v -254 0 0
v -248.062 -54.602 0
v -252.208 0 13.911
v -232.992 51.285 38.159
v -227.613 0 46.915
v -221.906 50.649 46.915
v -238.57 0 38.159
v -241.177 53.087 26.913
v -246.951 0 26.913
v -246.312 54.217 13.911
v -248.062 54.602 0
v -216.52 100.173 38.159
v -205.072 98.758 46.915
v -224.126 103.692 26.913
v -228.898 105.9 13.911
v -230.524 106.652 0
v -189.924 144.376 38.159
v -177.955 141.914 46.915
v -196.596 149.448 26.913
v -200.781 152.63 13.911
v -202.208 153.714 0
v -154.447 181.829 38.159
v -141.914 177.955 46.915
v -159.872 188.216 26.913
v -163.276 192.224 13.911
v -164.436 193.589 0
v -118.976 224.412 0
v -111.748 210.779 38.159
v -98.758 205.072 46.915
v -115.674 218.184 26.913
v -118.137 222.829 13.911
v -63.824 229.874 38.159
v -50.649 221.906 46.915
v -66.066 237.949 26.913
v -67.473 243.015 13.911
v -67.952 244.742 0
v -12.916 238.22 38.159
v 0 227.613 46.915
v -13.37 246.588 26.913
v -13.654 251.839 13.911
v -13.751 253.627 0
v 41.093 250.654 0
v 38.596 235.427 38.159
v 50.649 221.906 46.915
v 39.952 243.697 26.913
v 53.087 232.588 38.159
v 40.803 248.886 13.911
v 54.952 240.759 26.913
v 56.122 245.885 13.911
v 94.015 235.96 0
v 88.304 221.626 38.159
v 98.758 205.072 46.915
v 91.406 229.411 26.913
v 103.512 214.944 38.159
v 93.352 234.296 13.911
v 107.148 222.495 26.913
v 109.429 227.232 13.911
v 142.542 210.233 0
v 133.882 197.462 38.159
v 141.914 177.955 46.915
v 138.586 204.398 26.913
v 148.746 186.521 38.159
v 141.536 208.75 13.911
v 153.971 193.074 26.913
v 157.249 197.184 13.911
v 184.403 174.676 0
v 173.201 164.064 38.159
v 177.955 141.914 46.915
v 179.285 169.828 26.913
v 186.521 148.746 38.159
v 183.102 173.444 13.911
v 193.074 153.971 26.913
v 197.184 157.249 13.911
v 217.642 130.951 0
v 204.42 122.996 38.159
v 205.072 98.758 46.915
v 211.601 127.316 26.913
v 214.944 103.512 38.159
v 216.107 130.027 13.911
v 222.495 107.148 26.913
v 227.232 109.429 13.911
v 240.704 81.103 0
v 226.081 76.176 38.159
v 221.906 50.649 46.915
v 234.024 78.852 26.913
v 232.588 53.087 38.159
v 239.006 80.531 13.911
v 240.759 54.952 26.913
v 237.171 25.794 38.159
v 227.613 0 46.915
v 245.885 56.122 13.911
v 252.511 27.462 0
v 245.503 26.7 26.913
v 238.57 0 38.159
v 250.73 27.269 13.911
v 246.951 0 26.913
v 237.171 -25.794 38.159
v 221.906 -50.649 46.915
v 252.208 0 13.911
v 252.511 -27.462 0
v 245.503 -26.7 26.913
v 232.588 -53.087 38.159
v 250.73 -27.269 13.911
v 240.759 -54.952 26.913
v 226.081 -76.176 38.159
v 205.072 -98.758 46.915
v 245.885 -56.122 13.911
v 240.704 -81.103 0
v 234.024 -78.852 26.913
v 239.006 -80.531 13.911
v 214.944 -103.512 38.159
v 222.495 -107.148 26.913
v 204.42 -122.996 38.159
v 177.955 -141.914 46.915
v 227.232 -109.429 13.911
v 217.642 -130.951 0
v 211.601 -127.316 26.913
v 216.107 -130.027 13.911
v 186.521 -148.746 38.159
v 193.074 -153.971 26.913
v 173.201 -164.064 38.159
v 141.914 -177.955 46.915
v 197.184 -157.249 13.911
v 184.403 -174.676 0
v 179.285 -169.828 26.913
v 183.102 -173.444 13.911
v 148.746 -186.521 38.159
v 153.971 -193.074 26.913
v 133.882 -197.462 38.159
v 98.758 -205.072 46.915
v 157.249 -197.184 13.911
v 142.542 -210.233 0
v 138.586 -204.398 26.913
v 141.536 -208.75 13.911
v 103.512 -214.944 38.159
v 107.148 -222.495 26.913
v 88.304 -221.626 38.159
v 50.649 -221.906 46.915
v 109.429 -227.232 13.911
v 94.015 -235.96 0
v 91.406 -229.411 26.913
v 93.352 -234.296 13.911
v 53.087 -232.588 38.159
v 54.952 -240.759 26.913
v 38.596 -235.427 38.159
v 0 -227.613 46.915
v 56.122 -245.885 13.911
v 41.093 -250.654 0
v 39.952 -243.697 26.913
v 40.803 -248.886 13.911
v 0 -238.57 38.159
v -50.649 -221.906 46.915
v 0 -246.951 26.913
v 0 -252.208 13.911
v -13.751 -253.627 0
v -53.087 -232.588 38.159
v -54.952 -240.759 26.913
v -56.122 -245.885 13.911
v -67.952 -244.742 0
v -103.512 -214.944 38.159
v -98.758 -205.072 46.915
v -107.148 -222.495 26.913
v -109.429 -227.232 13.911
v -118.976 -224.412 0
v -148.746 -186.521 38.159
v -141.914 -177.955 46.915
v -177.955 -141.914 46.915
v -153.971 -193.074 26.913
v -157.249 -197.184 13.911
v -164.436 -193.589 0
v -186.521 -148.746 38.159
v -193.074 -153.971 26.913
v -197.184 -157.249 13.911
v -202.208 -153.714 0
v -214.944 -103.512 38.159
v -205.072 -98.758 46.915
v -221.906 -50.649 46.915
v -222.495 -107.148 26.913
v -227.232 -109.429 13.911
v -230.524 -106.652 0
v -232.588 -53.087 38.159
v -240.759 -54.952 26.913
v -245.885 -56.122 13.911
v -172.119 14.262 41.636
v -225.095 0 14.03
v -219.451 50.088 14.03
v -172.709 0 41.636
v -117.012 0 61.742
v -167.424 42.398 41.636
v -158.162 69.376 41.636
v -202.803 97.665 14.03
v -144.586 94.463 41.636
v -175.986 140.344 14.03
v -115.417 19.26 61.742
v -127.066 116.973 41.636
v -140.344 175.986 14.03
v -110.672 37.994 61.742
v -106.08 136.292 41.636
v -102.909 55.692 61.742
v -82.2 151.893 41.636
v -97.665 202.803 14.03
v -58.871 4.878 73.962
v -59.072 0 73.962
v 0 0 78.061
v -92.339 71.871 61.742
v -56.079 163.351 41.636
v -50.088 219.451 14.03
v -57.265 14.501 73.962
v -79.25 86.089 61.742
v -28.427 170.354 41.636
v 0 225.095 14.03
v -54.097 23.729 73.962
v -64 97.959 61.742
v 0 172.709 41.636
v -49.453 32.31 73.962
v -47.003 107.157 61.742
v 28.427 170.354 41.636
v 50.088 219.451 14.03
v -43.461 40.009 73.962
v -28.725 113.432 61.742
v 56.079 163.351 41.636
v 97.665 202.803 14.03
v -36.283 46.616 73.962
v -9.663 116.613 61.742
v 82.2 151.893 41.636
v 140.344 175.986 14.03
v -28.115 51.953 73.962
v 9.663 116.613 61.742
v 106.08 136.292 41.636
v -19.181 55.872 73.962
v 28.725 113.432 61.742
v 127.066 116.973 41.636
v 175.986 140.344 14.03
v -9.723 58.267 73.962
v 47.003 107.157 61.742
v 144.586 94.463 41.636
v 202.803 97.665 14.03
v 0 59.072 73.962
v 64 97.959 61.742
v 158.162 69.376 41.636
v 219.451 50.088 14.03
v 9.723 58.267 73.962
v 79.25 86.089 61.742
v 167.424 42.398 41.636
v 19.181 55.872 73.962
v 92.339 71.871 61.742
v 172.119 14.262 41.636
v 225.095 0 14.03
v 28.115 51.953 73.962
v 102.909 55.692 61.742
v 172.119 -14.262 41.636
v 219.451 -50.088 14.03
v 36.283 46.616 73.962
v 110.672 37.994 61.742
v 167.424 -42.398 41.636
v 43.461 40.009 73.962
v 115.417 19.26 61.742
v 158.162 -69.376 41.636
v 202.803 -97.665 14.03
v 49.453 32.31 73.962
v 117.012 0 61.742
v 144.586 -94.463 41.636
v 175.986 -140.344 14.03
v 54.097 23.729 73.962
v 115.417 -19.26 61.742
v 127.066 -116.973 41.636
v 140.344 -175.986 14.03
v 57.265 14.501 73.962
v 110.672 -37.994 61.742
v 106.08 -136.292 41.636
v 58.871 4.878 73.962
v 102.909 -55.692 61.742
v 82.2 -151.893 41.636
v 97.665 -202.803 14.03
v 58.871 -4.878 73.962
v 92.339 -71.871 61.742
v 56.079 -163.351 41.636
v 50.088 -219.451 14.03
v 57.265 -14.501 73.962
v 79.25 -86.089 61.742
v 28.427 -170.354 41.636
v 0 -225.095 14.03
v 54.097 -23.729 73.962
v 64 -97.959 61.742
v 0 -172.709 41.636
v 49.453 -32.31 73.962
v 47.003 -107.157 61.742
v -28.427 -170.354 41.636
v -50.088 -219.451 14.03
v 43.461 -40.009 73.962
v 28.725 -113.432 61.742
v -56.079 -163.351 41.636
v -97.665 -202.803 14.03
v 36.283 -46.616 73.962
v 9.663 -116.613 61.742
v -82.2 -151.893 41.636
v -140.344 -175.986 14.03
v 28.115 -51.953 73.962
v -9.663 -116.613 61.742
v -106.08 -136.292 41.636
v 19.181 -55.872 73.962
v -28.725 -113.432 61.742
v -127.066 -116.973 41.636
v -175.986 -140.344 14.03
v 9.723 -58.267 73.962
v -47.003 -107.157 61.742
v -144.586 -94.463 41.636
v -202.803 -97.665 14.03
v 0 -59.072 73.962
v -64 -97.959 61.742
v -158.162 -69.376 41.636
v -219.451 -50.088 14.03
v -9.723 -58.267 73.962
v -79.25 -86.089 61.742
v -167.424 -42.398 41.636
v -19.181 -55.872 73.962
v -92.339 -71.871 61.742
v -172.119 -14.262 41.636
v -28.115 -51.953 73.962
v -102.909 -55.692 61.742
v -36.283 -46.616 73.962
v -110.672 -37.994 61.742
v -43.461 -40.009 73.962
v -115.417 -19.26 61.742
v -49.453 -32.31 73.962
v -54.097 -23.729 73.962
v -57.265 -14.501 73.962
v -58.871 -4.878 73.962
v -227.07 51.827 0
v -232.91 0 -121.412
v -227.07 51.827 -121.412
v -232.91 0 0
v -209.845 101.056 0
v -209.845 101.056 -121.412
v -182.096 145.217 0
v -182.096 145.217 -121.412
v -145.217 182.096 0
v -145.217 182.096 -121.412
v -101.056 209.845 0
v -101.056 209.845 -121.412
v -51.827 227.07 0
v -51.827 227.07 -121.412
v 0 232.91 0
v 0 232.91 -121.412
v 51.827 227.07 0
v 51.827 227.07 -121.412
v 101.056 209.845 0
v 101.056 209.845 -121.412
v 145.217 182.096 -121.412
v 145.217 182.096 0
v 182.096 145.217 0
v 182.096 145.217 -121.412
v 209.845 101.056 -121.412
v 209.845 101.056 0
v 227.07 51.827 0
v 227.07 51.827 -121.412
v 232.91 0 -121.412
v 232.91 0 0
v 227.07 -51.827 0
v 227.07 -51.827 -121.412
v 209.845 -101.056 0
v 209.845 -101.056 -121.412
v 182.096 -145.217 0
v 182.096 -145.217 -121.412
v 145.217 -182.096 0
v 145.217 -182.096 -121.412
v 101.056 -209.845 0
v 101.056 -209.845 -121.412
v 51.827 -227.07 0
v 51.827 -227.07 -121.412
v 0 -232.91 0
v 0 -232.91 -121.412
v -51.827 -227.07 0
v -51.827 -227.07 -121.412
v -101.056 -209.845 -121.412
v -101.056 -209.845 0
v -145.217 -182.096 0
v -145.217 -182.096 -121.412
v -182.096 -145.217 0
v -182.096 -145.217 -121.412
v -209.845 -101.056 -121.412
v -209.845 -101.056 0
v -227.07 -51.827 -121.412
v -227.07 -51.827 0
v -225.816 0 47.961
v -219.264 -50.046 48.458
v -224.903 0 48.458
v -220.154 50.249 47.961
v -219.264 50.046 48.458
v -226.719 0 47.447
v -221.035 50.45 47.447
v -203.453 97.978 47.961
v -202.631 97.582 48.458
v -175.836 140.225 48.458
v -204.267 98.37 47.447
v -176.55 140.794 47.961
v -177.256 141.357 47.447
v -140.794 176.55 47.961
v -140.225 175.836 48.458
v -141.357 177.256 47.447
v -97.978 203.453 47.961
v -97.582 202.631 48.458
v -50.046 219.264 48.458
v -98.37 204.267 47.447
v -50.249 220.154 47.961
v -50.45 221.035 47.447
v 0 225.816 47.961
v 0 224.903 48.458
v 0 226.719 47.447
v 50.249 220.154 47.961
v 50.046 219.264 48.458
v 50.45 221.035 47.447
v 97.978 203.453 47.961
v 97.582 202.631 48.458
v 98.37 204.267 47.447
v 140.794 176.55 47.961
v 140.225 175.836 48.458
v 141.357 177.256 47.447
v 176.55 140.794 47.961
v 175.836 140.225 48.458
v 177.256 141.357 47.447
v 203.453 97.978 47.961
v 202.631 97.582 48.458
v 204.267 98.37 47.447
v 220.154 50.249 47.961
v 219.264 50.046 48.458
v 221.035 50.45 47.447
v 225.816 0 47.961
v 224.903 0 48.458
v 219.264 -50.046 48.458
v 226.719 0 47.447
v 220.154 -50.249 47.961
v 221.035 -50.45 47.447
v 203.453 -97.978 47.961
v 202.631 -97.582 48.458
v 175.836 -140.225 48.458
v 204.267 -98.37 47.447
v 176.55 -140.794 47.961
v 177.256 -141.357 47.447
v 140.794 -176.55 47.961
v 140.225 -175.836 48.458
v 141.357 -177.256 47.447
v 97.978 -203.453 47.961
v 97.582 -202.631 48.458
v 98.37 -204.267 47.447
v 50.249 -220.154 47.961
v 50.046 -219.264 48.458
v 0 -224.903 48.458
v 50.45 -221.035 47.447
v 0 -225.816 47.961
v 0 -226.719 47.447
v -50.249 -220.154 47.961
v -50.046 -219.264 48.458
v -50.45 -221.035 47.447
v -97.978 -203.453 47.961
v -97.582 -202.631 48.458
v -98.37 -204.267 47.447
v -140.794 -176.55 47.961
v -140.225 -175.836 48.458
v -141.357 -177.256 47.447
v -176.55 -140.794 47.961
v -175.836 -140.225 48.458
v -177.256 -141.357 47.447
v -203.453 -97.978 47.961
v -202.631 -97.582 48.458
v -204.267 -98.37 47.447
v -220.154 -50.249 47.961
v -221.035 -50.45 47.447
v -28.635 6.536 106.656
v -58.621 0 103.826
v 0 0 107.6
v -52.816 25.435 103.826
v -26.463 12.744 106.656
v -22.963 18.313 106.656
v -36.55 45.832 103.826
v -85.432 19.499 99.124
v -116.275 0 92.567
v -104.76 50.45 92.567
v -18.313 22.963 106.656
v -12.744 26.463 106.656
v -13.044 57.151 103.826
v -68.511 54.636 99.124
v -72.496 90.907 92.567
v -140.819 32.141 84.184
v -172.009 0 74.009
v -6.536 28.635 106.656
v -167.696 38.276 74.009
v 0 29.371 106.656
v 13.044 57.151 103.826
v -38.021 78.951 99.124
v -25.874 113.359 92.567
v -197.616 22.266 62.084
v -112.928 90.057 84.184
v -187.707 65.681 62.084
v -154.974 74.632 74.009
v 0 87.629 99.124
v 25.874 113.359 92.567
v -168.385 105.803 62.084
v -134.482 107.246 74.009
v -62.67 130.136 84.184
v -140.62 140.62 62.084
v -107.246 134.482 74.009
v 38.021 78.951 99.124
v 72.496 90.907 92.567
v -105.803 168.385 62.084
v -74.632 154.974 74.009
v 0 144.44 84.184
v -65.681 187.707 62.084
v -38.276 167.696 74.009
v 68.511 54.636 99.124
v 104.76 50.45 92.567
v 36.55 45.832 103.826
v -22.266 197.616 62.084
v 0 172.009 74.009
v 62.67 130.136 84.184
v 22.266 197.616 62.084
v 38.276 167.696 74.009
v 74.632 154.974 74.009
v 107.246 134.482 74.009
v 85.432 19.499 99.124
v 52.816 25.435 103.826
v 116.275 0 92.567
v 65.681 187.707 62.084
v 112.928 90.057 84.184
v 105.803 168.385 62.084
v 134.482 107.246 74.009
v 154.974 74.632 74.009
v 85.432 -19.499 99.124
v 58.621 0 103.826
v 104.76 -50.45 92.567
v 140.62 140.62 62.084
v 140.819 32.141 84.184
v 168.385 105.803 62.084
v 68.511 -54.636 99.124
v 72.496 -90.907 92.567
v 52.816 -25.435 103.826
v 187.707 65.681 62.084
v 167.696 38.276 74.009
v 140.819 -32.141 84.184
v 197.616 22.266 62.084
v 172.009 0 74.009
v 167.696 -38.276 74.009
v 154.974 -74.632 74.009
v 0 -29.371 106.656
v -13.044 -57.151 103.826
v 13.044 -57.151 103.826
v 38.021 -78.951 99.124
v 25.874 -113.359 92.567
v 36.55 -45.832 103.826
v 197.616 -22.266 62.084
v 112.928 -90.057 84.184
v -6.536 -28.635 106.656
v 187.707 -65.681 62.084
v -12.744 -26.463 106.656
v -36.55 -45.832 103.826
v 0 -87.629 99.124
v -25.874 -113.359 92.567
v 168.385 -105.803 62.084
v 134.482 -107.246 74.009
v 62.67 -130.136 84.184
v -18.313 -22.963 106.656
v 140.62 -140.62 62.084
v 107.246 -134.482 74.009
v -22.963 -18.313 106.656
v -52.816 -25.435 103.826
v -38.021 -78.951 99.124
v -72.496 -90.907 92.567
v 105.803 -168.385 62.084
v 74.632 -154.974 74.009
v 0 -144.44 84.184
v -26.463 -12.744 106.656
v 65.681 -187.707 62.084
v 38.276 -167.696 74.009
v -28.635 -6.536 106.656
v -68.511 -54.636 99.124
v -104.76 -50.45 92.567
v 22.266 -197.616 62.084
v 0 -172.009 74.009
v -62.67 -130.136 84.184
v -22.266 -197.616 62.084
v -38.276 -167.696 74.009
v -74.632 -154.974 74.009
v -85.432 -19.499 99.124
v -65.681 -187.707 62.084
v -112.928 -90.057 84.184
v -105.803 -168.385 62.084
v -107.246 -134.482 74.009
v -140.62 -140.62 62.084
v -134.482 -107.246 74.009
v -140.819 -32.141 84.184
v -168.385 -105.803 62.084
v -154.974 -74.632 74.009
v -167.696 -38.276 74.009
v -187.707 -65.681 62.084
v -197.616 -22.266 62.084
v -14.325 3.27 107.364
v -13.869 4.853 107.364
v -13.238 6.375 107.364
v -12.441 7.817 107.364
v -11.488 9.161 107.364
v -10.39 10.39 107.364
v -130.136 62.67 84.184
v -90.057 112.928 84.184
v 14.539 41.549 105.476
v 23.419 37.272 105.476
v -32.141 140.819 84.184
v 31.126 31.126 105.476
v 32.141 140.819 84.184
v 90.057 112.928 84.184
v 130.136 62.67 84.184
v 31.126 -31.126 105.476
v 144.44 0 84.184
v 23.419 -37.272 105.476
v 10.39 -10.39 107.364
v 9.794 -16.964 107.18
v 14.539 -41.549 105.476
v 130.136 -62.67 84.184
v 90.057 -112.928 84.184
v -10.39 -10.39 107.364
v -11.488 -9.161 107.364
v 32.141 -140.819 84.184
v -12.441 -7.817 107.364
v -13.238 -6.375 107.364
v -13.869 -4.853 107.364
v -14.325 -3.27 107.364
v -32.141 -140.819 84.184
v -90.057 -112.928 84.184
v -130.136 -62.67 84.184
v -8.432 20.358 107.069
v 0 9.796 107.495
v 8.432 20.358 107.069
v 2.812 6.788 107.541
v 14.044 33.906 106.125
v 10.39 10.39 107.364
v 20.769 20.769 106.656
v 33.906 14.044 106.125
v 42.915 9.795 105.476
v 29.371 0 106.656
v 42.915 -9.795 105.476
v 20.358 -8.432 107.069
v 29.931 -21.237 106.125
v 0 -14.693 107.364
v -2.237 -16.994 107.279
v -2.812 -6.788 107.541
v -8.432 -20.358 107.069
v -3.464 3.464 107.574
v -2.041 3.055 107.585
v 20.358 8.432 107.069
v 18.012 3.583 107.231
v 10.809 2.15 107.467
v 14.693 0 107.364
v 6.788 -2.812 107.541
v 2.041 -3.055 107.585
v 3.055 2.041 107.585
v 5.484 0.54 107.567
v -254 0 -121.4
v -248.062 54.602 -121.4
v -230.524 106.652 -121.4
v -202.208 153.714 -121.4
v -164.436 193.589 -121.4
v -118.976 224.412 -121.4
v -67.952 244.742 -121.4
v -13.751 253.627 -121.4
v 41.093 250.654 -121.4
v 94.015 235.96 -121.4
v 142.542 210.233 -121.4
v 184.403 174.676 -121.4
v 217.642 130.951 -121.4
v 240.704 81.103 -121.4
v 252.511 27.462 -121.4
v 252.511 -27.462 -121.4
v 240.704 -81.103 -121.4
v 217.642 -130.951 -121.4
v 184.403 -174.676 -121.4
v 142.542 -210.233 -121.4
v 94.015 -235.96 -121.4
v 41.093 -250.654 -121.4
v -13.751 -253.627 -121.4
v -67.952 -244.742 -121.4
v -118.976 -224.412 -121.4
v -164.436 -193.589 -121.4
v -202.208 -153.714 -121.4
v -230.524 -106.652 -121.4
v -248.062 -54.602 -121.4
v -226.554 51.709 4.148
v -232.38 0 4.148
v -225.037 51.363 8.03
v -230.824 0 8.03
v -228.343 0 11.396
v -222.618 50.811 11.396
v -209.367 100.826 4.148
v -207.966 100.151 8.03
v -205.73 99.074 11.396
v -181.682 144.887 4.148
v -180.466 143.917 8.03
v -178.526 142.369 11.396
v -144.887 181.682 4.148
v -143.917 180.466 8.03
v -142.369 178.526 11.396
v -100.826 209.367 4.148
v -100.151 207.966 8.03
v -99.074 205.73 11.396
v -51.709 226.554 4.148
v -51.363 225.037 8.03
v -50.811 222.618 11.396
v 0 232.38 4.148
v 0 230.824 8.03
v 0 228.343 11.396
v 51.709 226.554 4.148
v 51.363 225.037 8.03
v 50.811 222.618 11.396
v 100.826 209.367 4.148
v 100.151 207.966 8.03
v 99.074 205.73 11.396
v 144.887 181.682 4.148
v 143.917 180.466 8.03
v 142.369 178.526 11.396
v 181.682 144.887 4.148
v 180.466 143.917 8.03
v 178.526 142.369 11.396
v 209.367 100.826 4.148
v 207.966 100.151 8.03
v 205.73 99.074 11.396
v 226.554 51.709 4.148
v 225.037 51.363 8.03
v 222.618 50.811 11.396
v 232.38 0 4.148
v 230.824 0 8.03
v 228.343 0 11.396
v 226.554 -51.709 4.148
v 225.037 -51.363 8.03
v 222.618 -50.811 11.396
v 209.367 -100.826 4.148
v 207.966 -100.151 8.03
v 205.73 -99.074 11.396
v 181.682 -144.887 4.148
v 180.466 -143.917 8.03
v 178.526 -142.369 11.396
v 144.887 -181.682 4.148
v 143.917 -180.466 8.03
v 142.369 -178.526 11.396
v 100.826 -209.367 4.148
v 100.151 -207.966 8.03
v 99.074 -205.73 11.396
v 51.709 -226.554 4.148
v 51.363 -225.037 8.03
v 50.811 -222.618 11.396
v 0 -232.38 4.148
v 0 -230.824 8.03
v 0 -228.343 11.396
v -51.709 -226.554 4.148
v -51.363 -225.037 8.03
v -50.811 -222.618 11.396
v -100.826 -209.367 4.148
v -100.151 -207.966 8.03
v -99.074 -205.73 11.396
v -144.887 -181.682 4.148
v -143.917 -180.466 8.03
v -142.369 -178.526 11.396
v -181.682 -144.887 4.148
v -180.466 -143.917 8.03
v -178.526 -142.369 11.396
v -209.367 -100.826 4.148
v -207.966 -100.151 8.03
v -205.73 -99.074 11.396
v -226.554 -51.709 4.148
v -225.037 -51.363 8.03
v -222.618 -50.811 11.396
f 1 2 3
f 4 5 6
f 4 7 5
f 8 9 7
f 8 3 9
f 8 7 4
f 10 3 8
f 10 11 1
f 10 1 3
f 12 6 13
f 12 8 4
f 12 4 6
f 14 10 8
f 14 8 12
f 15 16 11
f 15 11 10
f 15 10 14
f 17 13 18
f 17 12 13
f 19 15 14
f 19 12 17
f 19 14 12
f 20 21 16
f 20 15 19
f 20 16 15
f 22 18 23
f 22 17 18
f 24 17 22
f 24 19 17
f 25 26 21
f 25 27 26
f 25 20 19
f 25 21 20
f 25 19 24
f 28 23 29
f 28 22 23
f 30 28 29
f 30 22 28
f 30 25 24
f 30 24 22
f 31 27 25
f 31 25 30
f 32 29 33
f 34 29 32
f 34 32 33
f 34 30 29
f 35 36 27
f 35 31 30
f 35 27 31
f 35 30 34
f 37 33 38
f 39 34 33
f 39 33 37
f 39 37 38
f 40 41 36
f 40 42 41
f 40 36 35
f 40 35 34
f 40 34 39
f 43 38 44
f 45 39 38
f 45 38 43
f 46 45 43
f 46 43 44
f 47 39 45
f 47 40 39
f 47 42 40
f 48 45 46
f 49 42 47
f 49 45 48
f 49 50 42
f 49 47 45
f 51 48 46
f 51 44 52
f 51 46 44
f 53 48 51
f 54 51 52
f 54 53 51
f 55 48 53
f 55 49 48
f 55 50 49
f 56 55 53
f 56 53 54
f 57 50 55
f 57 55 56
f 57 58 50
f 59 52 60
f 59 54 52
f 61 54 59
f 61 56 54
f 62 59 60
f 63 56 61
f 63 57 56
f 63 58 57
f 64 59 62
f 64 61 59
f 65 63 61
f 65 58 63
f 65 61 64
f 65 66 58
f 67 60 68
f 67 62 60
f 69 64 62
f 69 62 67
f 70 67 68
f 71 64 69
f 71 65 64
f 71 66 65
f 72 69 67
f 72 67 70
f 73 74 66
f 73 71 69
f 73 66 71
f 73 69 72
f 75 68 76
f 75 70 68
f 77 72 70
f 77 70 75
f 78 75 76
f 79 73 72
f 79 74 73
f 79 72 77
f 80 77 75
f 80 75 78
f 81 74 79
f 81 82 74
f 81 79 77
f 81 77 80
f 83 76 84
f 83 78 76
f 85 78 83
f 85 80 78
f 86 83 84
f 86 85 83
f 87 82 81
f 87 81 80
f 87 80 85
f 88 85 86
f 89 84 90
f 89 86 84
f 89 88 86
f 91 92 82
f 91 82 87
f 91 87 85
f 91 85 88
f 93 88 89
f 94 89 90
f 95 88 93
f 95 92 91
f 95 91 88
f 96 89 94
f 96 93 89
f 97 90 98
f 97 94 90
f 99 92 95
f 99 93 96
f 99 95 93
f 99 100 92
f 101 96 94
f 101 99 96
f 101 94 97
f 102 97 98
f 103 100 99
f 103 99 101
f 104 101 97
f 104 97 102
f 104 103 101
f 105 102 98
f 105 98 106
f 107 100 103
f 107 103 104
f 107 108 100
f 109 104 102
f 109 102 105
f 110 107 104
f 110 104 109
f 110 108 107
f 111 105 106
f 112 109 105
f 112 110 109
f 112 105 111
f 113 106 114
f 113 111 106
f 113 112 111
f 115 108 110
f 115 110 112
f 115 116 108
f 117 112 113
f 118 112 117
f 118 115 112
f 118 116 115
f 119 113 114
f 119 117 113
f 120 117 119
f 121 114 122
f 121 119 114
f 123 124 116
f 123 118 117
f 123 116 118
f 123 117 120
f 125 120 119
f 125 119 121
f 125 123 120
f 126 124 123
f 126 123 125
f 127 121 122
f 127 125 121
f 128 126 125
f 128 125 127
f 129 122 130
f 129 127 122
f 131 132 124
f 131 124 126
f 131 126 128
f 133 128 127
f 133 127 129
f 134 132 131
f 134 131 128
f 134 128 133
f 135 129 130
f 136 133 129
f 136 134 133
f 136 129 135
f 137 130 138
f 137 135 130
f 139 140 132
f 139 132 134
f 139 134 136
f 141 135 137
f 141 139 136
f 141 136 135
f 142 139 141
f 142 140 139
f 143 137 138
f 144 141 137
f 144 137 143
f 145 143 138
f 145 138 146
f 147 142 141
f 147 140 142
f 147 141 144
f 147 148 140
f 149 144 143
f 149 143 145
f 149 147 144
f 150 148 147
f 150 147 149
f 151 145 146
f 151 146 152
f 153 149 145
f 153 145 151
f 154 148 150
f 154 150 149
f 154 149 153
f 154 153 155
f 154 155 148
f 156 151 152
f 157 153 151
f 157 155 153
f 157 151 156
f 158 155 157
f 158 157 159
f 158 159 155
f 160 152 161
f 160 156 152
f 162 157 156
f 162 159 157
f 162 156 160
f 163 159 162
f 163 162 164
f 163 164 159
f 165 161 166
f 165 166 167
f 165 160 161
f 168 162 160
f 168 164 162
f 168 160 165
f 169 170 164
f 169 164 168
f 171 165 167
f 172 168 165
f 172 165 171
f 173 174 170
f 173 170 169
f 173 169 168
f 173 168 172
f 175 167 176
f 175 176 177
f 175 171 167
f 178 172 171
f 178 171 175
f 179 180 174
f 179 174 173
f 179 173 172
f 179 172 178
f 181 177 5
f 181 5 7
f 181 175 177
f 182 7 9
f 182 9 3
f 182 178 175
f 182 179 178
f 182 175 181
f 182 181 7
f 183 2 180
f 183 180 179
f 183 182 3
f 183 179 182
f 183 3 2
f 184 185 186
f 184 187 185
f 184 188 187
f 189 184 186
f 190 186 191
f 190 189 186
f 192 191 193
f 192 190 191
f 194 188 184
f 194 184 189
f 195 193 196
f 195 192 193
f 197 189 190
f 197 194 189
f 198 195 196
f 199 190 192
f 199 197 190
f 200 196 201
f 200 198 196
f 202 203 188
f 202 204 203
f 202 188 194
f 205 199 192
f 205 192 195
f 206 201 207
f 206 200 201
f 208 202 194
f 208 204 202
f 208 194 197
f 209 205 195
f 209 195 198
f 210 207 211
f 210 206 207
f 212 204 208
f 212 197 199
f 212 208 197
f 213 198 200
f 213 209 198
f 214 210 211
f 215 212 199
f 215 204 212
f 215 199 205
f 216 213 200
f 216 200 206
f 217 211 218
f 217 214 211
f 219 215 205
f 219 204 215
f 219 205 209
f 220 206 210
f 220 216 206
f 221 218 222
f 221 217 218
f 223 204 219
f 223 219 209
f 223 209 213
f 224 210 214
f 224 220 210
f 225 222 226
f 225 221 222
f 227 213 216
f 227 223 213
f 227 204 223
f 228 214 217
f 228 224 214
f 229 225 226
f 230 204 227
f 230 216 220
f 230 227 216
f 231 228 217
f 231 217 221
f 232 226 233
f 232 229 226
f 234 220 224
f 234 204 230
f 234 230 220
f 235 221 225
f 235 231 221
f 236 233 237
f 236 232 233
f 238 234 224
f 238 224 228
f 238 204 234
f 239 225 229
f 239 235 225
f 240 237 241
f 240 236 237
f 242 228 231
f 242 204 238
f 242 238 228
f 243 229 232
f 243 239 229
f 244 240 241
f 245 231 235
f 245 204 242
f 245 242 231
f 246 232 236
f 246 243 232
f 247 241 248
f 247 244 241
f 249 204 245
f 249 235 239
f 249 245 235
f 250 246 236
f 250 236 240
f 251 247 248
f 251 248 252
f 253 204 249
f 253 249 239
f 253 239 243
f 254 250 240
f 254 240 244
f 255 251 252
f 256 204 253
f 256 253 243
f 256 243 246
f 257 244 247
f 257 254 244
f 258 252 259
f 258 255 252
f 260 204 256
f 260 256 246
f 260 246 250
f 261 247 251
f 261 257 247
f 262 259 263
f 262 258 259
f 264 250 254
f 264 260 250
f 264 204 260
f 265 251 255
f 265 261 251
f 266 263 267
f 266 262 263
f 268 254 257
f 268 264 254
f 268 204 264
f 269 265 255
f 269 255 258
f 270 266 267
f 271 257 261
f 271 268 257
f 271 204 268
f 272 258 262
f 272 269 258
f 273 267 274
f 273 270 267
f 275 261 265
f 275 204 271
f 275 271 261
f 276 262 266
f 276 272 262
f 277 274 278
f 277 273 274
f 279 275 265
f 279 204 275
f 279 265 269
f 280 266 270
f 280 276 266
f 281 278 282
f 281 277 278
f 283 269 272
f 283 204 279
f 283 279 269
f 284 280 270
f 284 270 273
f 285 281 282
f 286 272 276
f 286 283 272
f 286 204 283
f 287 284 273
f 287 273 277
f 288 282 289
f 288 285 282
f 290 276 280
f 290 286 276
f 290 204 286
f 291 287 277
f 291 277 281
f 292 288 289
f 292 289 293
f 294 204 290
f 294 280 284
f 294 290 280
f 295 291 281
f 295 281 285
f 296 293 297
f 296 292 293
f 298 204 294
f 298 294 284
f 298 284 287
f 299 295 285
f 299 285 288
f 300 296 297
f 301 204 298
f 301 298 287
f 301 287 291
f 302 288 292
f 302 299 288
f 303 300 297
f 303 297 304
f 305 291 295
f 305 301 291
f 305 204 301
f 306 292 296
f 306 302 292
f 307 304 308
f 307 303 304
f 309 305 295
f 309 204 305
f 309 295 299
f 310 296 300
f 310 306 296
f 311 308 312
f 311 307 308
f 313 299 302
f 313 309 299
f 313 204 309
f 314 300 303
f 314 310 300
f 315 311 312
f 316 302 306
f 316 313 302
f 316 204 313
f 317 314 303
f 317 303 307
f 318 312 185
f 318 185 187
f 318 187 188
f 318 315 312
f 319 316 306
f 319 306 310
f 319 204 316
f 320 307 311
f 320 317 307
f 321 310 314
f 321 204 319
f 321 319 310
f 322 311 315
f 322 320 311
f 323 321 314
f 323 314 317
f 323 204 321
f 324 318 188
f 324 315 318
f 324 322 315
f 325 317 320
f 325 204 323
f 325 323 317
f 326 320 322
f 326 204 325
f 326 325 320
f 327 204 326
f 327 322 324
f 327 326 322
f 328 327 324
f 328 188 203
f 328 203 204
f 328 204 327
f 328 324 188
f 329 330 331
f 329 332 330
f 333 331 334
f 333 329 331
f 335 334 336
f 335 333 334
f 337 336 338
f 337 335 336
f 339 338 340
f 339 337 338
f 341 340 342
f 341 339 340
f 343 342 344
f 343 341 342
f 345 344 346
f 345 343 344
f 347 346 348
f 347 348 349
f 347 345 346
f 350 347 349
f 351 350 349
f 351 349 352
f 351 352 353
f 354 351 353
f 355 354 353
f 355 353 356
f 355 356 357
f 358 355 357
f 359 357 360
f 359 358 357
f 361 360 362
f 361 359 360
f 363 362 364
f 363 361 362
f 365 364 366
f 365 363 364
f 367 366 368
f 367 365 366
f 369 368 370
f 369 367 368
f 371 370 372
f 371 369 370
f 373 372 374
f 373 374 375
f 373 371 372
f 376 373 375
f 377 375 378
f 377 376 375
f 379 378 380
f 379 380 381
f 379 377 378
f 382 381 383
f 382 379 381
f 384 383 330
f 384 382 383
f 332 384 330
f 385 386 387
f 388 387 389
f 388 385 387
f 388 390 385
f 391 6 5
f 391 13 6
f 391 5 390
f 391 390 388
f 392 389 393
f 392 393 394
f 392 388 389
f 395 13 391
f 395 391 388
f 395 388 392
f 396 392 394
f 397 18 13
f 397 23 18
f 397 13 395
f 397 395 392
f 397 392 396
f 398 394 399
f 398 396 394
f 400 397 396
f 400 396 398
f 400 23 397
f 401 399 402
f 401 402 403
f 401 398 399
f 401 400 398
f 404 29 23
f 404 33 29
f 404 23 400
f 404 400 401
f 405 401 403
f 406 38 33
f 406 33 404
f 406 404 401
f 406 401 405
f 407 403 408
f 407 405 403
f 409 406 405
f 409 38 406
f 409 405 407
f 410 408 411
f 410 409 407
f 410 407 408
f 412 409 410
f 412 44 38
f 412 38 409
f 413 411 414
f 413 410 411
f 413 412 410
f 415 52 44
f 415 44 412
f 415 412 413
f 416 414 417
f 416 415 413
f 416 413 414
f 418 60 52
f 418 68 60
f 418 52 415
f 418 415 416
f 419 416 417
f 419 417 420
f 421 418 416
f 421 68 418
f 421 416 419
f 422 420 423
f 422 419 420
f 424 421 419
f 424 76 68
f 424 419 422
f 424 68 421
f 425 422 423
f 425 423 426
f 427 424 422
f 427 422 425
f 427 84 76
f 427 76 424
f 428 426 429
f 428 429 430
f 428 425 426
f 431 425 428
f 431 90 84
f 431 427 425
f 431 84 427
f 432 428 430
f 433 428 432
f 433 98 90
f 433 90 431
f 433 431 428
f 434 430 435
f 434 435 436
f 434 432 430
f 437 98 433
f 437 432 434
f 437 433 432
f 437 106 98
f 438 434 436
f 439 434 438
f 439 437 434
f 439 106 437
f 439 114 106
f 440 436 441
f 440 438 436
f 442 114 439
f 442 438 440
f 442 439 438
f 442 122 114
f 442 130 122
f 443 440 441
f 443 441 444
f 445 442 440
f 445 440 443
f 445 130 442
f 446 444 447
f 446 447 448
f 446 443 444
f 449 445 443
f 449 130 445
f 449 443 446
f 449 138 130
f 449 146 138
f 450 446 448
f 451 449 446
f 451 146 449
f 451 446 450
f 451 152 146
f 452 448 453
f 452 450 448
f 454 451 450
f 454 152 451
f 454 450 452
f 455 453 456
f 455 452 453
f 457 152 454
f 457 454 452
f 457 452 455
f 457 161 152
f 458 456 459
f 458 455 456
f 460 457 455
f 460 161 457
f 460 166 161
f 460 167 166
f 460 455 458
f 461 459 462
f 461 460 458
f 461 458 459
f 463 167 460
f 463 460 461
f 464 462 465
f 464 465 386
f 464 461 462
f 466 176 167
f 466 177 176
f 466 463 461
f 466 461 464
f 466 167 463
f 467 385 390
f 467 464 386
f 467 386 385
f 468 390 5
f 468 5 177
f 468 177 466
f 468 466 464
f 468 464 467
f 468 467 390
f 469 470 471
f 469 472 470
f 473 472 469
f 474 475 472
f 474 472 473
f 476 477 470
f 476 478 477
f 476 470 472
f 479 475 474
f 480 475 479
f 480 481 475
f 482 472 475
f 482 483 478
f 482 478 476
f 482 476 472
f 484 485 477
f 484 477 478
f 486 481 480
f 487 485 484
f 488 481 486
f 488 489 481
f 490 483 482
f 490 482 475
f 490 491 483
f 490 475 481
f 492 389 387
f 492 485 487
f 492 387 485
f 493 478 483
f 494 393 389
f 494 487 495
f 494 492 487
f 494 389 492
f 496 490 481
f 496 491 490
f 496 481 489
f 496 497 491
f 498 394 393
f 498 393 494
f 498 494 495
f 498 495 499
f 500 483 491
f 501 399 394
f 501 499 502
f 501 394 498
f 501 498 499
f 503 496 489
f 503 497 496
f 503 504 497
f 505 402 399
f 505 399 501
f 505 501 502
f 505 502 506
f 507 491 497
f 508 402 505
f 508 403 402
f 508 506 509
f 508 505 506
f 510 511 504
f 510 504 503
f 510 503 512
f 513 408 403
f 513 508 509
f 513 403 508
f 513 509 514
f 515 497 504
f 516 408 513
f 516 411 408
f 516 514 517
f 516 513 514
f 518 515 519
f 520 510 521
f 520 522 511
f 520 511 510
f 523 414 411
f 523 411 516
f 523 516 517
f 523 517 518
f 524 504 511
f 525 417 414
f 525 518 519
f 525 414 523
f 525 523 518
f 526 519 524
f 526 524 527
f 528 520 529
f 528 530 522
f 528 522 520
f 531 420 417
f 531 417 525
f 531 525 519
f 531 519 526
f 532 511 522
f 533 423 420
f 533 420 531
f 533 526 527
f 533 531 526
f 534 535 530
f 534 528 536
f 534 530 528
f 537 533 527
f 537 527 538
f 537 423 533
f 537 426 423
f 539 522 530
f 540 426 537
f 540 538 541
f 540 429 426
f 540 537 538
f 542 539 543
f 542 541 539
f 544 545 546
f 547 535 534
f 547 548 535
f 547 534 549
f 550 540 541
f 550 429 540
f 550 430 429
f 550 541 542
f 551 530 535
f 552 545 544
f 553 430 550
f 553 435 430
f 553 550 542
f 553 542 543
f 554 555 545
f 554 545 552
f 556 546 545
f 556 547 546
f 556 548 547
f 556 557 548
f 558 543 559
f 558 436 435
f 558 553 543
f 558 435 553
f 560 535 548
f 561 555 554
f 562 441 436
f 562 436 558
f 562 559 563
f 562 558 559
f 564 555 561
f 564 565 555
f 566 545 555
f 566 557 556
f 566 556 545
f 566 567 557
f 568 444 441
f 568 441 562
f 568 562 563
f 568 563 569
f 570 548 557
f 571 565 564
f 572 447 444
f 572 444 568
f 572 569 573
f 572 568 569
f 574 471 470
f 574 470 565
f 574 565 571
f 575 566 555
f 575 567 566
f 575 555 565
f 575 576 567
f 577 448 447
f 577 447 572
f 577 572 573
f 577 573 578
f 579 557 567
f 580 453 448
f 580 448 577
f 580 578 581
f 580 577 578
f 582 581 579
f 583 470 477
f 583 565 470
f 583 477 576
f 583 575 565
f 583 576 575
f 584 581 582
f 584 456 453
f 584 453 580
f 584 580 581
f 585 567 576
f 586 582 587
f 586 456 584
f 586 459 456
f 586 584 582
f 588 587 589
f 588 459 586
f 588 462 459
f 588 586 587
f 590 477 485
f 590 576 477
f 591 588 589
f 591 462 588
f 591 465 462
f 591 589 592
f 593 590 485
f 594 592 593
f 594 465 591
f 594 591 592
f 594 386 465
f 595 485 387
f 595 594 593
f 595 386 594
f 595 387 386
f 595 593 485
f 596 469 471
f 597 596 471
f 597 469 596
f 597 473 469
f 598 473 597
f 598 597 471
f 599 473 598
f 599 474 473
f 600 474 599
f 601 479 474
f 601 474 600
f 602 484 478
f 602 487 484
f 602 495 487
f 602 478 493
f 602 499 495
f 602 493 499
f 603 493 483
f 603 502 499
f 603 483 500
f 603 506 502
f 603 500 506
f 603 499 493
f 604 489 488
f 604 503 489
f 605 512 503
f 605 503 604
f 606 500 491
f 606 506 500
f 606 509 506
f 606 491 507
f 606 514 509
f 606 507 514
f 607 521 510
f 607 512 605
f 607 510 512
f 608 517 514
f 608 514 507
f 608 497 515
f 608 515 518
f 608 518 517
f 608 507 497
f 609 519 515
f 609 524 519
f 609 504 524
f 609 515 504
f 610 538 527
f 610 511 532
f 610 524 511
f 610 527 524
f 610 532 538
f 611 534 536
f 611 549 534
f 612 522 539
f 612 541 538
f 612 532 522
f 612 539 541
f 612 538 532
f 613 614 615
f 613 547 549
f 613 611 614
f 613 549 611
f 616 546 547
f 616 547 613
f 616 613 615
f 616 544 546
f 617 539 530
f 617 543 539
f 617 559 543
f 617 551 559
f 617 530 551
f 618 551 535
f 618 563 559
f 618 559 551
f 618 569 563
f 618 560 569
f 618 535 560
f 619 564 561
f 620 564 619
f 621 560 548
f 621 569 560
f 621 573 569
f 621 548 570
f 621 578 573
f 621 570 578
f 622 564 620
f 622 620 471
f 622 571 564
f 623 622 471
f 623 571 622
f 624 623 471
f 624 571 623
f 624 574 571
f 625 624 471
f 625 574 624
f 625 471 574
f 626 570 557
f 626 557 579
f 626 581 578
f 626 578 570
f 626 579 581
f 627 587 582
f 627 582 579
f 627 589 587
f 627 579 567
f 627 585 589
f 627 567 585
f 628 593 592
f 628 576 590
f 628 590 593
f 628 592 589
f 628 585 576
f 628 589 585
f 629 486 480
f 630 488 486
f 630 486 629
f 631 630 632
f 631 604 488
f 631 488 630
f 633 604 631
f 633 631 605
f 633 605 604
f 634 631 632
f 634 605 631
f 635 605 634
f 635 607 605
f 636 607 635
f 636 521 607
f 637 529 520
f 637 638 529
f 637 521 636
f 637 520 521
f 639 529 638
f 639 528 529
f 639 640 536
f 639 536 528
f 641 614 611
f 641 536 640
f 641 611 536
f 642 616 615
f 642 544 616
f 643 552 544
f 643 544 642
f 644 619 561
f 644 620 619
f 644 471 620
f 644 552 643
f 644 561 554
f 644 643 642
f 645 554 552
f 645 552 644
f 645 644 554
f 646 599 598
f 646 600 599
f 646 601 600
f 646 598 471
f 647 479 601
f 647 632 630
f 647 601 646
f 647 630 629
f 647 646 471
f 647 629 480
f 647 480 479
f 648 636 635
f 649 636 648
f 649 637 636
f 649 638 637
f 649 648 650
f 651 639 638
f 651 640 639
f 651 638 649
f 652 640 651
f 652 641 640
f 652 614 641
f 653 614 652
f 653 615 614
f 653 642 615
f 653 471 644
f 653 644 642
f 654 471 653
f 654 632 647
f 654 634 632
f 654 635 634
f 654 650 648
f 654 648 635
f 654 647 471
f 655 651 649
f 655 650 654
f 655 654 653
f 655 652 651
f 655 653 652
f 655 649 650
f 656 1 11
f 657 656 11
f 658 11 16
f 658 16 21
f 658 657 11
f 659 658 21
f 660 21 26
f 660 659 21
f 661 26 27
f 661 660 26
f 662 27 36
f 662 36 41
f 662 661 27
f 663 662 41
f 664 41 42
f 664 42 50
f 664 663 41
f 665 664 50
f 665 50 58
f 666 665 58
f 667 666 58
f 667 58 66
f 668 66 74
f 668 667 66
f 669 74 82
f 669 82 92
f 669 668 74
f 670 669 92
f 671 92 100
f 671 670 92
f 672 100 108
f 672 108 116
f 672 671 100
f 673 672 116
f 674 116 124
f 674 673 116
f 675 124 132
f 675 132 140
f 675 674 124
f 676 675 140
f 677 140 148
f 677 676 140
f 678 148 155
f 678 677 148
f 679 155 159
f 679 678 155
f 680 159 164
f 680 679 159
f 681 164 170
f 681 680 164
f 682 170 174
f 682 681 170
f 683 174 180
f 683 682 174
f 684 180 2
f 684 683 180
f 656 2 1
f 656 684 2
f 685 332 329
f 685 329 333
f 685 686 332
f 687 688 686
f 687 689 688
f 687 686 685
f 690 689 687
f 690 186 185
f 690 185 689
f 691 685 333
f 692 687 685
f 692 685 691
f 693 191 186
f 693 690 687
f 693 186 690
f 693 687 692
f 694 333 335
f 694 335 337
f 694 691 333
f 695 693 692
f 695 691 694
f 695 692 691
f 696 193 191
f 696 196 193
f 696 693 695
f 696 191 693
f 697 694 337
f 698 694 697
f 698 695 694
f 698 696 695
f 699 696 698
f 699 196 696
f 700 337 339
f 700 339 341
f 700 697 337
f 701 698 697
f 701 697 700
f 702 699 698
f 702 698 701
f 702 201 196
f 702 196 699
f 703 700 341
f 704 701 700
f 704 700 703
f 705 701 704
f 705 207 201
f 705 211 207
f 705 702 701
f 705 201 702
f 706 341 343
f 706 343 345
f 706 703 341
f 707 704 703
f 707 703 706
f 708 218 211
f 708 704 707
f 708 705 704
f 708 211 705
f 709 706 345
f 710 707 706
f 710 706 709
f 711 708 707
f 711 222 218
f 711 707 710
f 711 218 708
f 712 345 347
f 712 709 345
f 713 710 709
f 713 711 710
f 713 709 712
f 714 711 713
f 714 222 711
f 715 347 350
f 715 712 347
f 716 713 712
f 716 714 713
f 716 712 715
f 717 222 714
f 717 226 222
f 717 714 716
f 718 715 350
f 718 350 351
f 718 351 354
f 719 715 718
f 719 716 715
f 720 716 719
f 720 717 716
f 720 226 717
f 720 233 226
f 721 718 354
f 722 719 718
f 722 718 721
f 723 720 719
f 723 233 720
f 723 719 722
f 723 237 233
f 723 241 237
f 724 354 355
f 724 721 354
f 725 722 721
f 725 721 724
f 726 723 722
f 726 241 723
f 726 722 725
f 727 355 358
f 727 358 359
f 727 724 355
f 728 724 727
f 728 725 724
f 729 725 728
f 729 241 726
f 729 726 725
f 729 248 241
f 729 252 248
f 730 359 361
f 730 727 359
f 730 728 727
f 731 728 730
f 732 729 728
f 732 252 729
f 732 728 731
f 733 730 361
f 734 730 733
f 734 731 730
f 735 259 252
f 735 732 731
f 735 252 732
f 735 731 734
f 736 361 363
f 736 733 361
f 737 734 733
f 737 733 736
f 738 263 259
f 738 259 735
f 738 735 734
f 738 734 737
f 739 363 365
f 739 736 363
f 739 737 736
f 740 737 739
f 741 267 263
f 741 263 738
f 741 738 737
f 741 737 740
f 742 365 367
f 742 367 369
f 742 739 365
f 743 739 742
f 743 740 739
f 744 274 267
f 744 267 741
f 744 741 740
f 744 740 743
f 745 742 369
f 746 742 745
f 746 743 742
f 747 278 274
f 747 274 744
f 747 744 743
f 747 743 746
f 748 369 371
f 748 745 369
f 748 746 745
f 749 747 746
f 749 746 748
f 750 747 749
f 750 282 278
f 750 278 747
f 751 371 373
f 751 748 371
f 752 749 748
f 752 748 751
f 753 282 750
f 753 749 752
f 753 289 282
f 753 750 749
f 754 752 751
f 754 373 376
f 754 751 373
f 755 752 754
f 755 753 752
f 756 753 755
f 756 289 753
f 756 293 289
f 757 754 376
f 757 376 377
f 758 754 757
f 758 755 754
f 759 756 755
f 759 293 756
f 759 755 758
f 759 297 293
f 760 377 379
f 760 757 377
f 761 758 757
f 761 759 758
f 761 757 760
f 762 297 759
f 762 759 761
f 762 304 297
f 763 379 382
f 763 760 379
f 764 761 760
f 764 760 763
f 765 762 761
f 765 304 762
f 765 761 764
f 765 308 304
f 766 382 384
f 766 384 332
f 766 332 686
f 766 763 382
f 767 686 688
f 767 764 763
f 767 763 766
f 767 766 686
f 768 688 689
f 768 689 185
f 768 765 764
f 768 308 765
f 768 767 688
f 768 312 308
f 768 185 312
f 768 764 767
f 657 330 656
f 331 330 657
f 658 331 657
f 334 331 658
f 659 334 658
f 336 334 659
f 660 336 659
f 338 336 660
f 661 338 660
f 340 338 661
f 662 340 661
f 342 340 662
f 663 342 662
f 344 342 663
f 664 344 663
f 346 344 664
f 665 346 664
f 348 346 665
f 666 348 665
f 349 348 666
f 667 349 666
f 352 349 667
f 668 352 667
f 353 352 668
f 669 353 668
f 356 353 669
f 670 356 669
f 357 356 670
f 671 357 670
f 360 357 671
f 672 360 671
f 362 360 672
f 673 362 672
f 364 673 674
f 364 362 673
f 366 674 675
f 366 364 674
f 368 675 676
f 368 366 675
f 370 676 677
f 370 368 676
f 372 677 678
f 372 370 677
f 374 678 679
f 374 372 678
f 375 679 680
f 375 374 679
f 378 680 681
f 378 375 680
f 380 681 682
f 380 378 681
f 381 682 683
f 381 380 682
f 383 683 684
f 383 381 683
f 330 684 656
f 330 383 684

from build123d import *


with BuildPart() as f1:
    # F0 (on Front) → F1 (revolve)
    with BuildSketch(Plane.XZ):
        with BuildLine():
            ThreePointArc((-227.612872, 46.915095), (-246.950636, 26.913318), (-254, 0))
            Line((-254, 0), (-254, -121.4))
            Line((-254, -121.4), (-232.91, -121.412))
            Line((-232.91, -121.412), (-232.91, 0))
            ThreePointArc((-232.91, 0), (-230.824328, 8.029766), (-225.094589, 14.029537))
            ThreePointArc((-225.094589, 14.029537), (-117.012408, 61.741842), (0, 78.061098))
            Line((0, 78.061098), (0, 107.6))
            ThreePointArc((0, 107.6), (-116.274594, 92.567455), (-224.903069, 48.458349))
            ThreePointArc((-224.903069, 48.458349), (-226.259286, 47.689033), (-227.612872, 46.915095))
        make_face()
        with BuildLine():
            ThreePointArc((-224.903069, 48.458349), (-226.26893, 47.705967), (-227.612872, 46.915095))
            ThreePointArc((-227.612872, 46.915095), (-226.259286, 47.689033), (-224.903069, 48.458349))
        make_face()
    revolve(axis=Axis((0, 0, -7.412156), (0, 0, -1)))


solid = f1.part
